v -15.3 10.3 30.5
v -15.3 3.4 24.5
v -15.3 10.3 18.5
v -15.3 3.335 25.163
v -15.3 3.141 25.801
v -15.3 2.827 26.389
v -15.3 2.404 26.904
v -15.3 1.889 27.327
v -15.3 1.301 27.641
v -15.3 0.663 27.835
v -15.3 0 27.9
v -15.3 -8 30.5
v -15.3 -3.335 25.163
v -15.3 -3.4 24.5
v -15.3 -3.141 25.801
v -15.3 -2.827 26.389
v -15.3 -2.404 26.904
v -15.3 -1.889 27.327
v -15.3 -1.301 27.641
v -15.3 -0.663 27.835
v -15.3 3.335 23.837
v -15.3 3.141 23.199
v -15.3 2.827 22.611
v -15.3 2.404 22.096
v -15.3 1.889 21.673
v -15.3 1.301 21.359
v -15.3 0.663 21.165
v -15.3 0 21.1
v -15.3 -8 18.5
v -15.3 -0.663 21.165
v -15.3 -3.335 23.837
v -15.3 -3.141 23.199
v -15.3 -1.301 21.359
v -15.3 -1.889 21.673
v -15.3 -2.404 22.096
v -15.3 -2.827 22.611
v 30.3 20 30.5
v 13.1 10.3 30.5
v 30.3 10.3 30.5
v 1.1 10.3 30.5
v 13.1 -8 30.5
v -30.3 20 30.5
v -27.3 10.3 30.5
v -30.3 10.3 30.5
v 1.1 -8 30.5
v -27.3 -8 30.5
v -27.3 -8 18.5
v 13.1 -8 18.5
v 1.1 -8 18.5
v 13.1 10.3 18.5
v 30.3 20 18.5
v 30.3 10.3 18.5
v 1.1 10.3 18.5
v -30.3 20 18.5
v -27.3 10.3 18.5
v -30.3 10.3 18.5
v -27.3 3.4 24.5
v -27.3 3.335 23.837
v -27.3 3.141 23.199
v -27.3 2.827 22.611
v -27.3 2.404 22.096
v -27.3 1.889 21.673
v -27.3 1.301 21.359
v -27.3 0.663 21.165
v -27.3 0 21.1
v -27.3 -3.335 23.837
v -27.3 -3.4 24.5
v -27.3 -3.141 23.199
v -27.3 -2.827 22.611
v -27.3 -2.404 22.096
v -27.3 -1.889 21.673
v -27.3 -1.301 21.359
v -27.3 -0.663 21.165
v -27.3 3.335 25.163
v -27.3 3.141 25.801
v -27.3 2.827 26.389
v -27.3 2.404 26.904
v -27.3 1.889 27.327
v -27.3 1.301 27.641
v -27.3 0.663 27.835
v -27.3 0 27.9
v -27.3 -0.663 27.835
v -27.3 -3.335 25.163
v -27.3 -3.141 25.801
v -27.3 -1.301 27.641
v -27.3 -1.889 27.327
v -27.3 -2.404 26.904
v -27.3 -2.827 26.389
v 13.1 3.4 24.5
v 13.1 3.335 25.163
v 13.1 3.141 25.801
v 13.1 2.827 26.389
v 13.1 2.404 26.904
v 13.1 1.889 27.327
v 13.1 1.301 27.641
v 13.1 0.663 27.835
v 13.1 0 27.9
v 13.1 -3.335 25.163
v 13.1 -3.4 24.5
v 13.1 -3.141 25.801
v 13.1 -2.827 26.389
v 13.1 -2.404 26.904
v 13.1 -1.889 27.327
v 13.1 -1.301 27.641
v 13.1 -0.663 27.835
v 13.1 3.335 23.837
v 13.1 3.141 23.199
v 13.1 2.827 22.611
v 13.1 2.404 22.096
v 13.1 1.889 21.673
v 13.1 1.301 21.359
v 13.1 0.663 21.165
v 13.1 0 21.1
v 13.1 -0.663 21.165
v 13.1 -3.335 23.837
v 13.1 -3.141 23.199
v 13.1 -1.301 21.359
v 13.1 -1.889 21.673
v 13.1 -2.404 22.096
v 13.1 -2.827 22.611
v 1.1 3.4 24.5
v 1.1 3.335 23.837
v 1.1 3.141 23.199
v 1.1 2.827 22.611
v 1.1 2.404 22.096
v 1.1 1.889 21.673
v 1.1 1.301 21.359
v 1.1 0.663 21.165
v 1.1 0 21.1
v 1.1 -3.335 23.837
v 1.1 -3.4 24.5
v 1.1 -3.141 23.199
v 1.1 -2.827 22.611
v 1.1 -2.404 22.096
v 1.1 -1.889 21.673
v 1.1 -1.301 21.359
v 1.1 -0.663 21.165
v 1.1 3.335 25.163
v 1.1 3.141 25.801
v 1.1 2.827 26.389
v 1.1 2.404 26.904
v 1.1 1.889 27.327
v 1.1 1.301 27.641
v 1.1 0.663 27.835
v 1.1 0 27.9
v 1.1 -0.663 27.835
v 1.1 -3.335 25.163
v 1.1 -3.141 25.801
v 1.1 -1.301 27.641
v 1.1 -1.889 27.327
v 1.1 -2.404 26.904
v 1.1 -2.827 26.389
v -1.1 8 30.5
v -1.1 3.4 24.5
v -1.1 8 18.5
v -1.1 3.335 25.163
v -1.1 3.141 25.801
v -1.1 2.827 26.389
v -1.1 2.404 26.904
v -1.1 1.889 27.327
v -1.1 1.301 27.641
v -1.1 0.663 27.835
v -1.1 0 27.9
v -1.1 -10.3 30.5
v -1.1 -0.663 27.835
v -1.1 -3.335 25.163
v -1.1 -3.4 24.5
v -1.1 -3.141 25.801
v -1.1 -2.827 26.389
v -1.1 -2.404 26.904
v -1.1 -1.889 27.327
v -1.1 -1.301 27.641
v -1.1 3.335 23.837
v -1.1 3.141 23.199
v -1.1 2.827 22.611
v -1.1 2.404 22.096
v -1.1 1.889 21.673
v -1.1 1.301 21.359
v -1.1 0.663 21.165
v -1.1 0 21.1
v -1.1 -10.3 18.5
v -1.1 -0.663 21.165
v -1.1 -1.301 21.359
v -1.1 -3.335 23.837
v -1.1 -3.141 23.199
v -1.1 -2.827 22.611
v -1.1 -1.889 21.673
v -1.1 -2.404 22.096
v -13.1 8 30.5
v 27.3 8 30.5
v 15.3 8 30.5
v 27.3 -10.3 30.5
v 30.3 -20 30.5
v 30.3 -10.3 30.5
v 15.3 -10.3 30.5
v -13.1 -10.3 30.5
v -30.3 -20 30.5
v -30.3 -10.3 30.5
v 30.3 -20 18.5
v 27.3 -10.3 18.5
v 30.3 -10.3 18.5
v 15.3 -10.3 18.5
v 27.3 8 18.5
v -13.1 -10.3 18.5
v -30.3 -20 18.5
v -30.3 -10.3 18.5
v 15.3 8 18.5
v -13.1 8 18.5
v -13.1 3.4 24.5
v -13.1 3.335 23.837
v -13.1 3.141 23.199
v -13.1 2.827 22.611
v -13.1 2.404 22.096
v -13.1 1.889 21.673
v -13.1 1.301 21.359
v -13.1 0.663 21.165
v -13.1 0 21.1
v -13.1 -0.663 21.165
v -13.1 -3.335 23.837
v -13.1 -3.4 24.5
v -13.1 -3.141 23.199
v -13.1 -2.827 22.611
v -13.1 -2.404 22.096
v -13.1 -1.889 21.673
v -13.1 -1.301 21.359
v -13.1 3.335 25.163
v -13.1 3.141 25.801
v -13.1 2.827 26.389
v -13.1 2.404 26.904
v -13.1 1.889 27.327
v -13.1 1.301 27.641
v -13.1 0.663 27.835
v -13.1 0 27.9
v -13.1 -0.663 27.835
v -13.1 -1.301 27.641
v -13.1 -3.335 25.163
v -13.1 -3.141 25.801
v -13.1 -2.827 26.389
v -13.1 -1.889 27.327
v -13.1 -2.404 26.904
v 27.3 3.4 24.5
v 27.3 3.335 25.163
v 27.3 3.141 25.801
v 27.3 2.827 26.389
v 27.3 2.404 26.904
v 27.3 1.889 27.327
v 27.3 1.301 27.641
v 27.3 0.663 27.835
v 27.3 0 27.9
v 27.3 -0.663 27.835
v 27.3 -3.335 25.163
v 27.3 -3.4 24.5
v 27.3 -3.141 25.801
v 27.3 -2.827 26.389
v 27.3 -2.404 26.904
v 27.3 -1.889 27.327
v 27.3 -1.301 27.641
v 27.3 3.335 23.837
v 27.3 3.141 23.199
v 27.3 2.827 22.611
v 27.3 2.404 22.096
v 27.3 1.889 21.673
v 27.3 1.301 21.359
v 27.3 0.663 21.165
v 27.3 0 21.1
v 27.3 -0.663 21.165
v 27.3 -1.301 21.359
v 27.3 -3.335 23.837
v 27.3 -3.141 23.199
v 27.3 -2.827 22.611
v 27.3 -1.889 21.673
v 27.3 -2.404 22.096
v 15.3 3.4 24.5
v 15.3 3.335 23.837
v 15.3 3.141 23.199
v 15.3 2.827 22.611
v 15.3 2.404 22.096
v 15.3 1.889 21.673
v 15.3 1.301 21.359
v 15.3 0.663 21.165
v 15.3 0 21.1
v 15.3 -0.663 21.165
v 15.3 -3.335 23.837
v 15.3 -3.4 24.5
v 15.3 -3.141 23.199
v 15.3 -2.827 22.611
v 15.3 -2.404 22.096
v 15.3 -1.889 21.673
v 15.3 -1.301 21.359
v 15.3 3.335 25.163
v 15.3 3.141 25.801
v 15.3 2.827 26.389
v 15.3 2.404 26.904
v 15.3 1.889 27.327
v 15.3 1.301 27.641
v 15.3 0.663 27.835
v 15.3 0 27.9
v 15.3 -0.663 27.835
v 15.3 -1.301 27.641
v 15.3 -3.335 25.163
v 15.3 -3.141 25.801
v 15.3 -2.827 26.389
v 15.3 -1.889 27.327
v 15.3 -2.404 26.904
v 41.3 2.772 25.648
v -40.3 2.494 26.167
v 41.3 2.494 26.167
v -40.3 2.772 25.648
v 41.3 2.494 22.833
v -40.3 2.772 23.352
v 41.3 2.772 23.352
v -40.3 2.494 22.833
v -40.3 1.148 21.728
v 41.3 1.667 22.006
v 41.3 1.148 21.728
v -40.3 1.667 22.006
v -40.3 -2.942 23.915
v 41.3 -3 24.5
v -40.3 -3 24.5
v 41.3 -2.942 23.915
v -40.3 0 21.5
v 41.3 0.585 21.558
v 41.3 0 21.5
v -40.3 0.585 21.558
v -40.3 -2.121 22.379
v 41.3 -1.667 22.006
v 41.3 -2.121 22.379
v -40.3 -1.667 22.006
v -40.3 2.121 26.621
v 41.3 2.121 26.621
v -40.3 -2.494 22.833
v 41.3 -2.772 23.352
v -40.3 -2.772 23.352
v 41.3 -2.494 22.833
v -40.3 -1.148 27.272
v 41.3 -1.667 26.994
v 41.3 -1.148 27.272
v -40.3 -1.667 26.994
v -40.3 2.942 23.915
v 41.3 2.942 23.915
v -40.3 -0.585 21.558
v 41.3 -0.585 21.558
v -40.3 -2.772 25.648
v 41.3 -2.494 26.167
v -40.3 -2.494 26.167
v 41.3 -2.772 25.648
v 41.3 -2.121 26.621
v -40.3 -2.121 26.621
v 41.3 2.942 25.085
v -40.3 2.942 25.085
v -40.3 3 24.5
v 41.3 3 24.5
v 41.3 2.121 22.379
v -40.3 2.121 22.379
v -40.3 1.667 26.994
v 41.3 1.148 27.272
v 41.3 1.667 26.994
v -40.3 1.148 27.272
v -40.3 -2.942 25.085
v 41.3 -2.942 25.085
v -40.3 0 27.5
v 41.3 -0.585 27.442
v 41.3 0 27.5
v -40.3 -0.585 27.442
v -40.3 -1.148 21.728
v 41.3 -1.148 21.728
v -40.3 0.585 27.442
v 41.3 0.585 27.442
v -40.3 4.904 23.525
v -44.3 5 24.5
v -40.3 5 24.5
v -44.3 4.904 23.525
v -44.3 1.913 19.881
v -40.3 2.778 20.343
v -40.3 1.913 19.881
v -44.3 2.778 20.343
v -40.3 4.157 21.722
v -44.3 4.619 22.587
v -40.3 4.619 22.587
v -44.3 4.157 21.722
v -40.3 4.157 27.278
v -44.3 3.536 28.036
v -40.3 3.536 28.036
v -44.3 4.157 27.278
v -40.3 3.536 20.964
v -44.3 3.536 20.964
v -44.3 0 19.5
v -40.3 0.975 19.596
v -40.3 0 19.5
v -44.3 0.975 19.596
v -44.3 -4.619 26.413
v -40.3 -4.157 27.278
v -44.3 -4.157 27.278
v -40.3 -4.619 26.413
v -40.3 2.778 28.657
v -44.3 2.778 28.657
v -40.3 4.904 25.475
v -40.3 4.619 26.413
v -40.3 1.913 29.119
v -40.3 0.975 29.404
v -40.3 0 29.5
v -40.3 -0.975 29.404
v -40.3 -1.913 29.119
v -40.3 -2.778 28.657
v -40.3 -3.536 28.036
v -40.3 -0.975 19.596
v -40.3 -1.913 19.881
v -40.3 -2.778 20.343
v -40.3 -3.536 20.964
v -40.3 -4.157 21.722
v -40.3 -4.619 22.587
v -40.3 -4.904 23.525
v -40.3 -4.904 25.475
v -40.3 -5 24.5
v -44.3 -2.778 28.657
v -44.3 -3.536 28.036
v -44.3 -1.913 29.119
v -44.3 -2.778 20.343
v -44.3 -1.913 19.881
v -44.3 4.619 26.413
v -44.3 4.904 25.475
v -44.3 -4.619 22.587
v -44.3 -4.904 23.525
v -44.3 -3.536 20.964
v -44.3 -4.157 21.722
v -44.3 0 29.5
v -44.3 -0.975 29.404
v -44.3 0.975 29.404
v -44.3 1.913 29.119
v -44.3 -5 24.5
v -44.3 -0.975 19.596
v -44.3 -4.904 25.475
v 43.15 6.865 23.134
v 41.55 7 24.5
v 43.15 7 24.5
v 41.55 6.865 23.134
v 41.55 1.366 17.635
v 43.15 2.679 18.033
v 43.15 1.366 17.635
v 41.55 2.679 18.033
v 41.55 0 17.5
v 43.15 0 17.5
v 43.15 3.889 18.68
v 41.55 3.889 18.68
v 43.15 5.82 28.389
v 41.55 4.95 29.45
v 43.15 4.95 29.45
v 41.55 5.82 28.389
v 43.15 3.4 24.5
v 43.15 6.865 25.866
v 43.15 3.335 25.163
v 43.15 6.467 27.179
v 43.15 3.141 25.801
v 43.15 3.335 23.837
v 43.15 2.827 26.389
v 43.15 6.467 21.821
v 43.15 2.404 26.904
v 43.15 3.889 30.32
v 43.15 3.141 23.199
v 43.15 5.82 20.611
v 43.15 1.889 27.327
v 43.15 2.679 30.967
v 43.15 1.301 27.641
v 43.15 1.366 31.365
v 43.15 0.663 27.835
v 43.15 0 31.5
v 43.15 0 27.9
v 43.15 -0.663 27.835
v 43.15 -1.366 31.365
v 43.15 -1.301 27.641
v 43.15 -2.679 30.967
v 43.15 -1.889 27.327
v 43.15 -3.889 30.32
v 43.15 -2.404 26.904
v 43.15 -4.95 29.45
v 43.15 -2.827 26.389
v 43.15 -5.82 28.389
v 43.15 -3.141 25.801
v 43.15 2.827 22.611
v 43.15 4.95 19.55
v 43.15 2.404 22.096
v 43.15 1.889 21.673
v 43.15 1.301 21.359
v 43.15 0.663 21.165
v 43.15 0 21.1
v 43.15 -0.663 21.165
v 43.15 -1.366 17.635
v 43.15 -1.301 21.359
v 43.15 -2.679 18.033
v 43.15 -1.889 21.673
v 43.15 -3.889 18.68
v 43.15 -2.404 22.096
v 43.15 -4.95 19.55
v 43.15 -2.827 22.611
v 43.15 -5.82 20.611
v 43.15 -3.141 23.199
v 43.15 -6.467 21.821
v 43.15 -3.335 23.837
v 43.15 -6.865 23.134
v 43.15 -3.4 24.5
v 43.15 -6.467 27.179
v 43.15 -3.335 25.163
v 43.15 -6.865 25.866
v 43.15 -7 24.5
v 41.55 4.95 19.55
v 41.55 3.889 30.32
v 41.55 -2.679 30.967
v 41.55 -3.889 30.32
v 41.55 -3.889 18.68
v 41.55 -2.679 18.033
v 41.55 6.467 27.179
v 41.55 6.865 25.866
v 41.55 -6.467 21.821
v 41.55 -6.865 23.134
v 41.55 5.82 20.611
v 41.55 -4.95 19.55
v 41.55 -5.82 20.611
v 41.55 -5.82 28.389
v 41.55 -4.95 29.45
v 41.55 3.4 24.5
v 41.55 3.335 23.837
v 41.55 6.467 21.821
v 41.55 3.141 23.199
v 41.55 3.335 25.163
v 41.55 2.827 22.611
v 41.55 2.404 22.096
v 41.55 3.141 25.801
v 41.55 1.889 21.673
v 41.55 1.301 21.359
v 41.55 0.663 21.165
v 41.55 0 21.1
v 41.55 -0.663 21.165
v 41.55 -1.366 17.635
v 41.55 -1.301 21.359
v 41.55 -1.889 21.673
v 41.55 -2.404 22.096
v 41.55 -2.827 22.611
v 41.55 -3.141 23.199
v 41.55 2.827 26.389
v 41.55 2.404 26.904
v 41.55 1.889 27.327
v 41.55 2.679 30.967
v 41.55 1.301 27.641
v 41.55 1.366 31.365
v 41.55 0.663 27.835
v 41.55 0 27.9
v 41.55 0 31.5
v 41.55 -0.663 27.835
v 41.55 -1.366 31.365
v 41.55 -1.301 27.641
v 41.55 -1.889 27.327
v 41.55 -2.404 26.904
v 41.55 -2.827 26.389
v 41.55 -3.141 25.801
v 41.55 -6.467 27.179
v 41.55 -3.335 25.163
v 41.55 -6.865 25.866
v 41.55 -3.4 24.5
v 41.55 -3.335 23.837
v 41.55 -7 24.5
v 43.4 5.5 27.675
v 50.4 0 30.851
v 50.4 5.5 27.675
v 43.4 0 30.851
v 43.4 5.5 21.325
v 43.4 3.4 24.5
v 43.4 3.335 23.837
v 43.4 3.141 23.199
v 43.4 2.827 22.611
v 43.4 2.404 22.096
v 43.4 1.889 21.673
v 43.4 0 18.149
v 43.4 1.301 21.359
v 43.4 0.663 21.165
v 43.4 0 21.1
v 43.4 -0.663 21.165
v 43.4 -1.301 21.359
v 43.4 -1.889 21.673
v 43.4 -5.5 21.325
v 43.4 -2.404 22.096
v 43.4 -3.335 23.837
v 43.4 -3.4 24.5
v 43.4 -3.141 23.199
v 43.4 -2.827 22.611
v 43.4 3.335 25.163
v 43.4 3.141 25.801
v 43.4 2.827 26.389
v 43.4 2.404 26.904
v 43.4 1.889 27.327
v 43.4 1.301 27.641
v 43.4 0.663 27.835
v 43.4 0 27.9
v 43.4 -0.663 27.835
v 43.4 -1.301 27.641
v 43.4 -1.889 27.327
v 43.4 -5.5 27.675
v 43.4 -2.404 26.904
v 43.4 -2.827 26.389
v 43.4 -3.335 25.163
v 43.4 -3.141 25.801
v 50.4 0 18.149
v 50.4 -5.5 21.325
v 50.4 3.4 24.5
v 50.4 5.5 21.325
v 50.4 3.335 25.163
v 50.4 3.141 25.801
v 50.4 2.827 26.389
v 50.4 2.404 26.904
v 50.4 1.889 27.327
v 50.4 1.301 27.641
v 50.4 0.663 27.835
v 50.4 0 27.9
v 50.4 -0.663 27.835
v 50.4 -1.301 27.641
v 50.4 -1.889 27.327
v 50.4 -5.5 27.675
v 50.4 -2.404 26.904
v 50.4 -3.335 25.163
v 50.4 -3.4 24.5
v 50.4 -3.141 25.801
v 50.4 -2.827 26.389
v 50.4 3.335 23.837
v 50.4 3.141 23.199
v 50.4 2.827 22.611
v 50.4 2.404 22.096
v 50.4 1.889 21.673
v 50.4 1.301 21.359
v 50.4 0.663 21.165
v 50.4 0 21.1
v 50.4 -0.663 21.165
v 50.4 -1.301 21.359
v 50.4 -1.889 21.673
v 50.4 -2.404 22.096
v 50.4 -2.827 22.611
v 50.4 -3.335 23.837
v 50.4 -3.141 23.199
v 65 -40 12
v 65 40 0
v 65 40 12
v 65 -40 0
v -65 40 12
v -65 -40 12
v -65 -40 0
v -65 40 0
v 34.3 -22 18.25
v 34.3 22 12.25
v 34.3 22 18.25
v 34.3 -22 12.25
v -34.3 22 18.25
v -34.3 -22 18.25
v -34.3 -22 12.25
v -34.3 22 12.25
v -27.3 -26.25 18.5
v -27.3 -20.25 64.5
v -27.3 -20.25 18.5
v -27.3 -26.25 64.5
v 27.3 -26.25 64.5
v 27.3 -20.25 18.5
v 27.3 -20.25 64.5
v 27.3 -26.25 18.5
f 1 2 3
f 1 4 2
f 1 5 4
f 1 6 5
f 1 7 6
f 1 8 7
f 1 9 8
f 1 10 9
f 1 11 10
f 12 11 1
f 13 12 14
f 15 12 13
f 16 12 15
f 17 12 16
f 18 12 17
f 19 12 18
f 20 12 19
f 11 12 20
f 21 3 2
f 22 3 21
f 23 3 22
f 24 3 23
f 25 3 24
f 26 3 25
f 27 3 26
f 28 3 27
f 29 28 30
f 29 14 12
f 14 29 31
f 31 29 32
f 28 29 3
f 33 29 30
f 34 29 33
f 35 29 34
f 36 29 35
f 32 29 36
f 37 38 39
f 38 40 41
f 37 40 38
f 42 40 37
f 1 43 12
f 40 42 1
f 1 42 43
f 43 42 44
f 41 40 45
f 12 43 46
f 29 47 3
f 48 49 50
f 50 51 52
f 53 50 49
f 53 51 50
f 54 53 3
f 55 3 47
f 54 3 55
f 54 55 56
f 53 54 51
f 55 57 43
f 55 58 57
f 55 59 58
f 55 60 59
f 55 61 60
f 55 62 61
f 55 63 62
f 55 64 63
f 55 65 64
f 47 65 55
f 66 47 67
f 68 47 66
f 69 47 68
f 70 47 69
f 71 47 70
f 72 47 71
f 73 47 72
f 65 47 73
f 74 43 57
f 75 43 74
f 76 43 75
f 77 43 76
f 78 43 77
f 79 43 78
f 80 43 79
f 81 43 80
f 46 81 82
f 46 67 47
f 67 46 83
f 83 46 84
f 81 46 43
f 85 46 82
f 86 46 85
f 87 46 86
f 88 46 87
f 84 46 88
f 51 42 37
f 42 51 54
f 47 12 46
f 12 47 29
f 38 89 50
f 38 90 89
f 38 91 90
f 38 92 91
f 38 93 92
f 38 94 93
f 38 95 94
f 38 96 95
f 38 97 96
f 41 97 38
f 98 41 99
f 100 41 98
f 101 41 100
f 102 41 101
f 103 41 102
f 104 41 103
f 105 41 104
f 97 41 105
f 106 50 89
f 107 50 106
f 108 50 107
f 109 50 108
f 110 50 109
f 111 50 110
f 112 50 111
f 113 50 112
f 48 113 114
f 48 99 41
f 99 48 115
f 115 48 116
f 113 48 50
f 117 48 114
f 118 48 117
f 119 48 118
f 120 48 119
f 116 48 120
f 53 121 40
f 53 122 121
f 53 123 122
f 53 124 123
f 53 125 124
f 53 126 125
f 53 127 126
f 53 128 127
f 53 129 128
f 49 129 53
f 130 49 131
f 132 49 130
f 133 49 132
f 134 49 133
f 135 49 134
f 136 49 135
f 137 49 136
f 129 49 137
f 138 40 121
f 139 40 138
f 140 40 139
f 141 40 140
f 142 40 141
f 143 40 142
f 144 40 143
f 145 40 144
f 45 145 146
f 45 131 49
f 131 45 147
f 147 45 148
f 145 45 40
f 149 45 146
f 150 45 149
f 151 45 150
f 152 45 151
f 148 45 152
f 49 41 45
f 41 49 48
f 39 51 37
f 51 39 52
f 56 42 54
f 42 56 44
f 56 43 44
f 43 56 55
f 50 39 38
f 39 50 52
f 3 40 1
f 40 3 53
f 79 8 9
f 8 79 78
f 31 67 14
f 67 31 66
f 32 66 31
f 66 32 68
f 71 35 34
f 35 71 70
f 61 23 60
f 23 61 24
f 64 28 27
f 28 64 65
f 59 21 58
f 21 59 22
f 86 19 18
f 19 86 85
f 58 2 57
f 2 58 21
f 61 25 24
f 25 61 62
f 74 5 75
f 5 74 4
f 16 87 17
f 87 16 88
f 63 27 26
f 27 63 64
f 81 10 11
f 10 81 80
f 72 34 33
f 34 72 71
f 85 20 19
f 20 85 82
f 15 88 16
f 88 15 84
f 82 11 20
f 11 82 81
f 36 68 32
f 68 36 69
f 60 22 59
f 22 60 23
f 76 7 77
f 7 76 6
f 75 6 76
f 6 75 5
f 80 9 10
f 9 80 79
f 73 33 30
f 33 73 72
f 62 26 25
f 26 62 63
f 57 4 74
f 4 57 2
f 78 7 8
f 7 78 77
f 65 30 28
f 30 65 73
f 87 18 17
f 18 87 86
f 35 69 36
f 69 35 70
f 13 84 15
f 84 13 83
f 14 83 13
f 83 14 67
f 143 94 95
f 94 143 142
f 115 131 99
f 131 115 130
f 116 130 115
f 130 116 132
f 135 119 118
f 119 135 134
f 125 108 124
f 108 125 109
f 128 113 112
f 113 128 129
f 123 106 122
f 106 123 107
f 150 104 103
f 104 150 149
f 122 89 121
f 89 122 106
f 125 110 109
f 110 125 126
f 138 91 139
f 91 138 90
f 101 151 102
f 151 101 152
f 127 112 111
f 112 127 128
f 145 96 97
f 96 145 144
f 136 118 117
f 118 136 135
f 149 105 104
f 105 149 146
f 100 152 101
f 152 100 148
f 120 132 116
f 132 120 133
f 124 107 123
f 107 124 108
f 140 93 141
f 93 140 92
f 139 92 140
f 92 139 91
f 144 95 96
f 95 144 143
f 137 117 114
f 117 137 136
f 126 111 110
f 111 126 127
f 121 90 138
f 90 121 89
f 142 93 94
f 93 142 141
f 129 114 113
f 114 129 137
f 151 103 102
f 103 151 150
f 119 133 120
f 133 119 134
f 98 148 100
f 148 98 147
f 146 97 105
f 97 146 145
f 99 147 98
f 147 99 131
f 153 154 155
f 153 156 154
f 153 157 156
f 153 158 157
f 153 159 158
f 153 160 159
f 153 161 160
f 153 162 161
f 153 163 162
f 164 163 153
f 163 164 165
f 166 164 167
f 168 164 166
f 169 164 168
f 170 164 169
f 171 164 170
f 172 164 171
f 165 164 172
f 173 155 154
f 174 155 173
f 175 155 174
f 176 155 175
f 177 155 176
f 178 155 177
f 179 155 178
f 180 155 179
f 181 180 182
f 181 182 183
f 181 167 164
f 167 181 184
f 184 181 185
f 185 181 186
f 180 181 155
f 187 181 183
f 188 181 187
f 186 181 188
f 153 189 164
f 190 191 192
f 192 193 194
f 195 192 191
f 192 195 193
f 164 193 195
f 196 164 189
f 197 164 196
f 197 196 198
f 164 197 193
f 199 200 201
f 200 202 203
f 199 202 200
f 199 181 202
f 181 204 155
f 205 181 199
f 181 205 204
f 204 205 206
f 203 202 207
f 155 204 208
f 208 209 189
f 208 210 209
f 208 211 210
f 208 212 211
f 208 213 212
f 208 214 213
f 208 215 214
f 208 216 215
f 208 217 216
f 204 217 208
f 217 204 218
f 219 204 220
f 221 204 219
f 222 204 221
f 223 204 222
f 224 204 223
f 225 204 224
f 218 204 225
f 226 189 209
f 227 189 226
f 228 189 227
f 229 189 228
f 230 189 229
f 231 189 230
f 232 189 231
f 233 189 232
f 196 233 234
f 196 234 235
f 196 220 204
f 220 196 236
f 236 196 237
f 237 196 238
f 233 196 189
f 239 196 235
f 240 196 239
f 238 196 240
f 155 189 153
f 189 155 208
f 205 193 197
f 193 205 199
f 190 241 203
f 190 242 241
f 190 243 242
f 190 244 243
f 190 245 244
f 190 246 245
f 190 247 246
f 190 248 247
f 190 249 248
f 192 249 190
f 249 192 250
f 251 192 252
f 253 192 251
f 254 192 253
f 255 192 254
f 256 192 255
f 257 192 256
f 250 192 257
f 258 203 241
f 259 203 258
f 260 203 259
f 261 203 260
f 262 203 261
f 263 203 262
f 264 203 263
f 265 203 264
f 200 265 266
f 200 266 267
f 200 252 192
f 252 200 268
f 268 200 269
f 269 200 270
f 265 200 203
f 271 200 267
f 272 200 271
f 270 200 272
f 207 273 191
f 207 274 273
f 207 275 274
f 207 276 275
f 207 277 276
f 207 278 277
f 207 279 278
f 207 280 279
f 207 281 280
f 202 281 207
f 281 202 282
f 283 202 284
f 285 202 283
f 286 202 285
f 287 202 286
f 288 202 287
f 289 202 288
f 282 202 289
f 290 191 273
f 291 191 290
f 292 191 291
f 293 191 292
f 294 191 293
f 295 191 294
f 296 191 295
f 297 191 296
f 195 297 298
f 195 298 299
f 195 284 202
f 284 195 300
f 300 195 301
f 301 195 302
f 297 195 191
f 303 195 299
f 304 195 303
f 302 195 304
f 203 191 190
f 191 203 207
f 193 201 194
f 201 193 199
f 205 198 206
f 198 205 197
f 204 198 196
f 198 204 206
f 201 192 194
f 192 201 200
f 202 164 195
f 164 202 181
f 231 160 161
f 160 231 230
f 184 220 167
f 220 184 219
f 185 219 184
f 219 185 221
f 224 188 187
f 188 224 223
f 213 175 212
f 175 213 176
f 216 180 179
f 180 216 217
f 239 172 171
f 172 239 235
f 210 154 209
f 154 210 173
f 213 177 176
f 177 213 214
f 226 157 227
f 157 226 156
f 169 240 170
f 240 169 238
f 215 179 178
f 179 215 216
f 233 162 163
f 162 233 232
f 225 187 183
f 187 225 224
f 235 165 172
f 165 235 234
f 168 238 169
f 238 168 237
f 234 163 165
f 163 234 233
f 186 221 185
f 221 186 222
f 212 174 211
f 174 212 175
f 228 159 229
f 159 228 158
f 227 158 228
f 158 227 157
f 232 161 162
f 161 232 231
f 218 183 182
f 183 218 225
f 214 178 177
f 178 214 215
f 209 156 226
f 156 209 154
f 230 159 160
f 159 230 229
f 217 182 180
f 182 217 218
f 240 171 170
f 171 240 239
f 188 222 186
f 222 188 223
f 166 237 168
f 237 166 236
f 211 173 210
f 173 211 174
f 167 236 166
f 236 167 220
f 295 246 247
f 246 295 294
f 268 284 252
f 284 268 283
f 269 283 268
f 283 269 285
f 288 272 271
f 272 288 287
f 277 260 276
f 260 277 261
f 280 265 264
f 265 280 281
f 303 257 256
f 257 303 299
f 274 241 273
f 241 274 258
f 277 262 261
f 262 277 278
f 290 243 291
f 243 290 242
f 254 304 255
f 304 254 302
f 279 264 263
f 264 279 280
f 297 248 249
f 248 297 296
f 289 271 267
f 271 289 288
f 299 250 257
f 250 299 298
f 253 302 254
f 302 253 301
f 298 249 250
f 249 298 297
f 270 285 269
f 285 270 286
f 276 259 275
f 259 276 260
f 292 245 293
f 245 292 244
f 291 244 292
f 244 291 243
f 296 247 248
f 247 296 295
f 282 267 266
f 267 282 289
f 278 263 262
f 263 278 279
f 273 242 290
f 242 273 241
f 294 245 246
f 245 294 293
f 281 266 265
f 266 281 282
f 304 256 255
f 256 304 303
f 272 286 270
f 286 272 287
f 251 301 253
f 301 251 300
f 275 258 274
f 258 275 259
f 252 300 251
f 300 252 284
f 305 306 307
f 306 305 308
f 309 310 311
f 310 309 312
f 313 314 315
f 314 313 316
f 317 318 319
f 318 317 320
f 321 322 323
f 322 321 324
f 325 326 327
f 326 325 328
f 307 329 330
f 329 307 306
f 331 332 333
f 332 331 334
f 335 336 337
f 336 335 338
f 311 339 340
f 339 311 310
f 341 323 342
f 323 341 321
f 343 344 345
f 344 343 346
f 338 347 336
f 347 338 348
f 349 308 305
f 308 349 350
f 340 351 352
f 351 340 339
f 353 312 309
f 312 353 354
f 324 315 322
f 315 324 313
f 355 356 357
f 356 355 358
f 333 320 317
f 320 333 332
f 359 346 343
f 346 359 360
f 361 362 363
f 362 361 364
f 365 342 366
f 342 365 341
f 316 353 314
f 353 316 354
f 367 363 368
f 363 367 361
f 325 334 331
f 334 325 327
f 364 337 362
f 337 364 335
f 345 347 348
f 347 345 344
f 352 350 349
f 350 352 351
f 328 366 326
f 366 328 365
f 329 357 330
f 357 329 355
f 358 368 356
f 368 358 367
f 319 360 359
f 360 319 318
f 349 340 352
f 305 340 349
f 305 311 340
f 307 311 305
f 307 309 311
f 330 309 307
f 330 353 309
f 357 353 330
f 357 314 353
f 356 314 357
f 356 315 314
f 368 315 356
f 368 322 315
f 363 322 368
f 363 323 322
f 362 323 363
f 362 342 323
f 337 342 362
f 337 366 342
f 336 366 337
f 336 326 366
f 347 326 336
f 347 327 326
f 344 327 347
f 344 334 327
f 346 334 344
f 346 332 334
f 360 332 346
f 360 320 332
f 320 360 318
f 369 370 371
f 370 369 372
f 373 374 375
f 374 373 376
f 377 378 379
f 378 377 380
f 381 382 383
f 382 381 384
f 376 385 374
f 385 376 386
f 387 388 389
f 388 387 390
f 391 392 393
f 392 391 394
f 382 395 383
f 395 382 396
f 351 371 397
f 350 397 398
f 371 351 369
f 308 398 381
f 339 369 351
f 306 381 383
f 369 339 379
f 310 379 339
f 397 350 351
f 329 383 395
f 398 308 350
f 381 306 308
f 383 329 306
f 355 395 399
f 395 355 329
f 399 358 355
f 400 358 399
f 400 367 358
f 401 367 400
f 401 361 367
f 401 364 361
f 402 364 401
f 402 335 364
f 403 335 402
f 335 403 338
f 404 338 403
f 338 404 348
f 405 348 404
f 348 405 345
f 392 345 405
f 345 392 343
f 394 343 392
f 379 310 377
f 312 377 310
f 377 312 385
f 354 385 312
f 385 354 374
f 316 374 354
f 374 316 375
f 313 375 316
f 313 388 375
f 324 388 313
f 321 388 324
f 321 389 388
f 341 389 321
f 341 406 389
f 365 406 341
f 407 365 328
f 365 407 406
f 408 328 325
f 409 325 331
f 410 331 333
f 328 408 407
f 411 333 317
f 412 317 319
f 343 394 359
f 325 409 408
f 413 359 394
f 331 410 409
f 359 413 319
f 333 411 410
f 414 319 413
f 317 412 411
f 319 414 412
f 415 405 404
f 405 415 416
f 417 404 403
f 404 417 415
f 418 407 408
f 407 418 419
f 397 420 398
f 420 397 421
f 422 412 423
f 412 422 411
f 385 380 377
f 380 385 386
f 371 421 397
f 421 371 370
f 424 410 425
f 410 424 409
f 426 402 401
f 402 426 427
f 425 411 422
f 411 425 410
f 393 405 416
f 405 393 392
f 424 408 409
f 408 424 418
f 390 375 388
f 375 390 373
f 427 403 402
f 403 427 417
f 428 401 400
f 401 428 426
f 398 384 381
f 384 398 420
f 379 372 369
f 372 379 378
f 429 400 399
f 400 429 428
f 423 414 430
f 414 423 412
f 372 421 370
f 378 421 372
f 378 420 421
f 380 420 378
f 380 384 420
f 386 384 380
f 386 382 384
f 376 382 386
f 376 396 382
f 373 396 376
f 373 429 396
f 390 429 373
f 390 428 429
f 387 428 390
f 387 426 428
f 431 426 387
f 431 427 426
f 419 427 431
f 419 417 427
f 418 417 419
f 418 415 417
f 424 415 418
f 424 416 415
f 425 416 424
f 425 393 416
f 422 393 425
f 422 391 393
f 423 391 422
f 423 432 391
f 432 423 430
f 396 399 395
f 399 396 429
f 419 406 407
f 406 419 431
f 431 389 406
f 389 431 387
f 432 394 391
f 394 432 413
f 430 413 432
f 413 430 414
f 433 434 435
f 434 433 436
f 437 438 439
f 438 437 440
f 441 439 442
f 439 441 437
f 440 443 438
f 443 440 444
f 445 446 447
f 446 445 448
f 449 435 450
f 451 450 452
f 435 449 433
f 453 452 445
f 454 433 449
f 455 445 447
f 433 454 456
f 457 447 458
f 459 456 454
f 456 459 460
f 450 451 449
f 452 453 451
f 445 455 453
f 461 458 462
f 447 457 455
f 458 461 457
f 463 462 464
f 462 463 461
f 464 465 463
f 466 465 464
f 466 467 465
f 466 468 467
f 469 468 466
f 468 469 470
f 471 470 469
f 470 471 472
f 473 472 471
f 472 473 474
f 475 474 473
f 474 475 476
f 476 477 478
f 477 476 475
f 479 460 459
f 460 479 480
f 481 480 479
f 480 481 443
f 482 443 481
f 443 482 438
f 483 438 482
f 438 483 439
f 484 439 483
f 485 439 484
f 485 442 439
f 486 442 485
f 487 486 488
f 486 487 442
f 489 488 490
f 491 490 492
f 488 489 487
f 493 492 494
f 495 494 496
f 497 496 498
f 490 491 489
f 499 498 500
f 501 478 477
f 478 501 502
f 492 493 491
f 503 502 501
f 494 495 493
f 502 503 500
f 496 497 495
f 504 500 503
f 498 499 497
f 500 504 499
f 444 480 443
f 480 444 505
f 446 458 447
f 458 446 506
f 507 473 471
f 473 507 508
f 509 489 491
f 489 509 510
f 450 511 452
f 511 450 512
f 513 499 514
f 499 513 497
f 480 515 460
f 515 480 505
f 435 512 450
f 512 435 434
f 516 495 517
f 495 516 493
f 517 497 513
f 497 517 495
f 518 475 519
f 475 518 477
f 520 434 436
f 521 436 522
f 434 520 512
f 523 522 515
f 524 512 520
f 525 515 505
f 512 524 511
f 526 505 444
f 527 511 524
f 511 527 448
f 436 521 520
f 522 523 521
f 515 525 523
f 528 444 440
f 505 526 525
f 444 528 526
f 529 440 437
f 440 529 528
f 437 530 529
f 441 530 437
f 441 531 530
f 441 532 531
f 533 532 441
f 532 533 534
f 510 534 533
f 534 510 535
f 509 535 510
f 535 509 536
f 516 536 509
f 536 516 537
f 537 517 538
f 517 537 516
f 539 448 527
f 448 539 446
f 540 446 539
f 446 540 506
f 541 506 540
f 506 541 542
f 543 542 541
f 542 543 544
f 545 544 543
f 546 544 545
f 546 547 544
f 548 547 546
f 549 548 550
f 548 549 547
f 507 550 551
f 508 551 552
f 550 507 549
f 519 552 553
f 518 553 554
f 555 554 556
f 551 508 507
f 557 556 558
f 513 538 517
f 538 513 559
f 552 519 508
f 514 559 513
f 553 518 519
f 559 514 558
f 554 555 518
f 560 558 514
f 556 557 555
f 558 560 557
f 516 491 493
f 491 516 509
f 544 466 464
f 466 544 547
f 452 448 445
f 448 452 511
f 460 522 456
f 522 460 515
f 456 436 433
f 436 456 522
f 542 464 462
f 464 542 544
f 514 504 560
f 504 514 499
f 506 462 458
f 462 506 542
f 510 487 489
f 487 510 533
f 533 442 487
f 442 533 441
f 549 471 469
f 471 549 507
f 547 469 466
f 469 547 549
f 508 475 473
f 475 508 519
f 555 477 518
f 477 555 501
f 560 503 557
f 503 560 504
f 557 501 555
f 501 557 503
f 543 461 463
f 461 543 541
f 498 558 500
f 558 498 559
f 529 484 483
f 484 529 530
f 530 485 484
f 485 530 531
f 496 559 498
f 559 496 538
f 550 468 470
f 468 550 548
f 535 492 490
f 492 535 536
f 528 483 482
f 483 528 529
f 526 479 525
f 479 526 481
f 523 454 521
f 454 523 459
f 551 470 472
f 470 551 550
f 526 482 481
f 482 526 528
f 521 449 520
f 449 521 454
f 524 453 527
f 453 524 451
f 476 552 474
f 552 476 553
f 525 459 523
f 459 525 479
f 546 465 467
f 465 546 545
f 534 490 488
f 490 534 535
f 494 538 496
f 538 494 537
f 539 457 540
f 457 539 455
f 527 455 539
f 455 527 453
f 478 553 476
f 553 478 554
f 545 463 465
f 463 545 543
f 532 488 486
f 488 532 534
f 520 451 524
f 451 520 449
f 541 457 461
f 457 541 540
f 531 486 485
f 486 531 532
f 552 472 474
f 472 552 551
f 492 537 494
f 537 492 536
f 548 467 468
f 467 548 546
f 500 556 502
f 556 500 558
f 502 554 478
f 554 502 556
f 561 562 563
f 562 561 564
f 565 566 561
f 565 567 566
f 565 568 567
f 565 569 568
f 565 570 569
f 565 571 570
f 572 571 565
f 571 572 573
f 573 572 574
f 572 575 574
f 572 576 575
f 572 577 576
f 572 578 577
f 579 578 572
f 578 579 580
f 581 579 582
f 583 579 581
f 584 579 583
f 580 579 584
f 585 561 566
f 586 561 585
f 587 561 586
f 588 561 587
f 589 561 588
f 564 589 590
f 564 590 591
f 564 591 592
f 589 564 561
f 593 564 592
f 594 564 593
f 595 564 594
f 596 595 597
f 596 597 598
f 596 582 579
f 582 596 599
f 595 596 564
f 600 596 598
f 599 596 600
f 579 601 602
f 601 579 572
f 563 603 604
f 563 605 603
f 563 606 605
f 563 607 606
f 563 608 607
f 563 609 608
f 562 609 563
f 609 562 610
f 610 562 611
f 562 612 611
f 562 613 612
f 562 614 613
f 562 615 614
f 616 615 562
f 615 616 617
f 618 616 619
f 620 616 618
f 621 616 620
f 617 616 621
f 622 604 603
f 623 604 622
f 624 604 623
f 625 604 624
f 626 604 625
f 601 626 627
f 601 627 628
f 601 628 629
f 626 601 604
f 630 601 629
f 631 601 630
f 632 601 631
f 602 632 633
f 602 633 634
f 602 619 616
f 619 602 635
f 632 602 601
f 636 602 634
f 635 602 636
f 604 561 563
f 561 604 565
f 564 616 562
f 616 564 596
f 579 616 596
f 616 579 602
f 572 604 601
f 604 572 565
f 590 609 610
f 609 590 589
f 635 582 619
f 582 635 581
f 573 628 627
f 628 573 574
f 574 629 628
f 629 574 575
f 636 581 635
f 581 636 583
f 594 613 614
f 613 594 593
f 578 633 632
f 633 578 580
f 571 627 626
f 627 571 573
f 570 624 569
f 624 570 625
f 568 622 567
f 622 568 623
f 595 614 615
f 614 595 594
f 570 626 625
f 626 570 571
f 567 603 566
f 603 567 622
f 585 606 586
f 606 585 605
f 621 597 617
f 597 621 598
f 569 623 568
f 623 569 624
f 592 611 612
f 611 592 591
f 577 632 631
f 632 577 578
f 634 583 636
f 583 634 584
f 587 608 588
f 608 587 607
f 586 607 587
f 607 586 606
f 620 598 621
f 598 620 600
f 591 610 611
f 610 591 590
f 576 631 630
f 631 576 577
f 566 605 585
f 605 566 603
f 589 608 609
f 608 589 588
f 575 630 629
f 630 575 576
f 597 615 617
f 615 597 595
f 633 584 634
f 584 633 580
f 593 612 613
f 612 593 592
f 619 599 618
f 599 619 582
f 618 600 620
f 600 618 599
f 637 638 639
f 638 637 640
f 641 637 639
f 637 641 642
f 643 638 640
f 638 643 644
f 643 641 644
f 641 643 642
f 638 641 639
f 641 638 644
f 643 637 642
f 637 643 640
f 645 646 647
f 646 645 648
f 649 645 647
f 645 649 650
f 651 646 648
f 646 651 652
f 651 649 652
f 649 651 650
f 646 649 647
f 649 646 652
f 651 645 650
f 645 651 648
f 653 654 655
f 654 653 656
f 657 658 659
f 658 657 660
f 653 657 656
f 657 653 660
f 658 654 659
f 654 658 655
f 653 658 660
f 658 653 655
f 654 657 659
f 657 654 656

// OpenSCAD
$fn = 32;

// ------------------------------------------------------------------------
// Comb hinge with flap: leaf 60.6 x 20 mm, pin d6, flap 46 mm
// Every part is its own module, assembly() places every instance.
// ------------------------------------------------------------------------

// --- part 1 ---
module hinge_bed() {
  difference() {
    translate([-65, -40, 0]) cube([130, 80, 12]);
  }
}

// --- part 2 ---
module hinge_riser() {
  difference() {
    translate([-34.3, -22, 0]) cube([68.6, 44, 6]);
  }
}

// --- part 3 ---
module hinge_leaf_a() {
  difference() {
    union() {
      translate([-27.3, -8, -6]) cube([12, 28, 12]);
      translate([1.1, -8, -6]) cube([12, 28, 12]);
      translate([-30.3, 10.3, -6]) cube([60.6, 9.7, 12]);
    }
    translate([-21.3, 0, 0]) rotate([0, 90, 0]) cylinder(h = 14, d = 6.8, center = true);
    translate([7.1, 0, 0]) rotate([0, 90, 0]) cylinder(h = 14, d = 6.8, center = true);
  }
}

// --- part 4 ---
module hinge_leaf_b() {
  difference() {
    union() {
      translate([-13.1, -20, -6]) cube([12, 28, 12]);
      translate([15.3, -20, -6]) cube([12, 28, 12]);
      translate([-30.3, -20, -6]) cube([60.6, 9.7, 12]);
    }
    translate([-7.1, 0, 0]) rotate([0, 90, 0]) cylinder(h = 14, d = 6.8, center = true);
    translate([21.3, 0, 0]) rotate([0, 90, 0]) cylinder(h = 14, d = 6.8, center = true);
  }
}

// --- part 5 ---
module hinge_flap() {
  difference() {
    translate([-27.3, -23, 0]) cube([54.6, 46, 6]);
  }
}

// --- part 6 ---
module hinge_pin() {
  rotate([0, 90, 0]) cylinder(h = 82.6, d = 6, center = true);
  translate([-44.3, 0, 0]) rotate([0, 90, 0]) cylinder(h = 4, d = 10);
}

// --- part 7 ---
module pin_washer() {
  difference() {
      translate([0, 0, 0]) cylinder(h = 1.6, d = 14);
      translate([0, 0, -1]) cylinder(h = 3.6, d = 6.8);
    }
}

// --- part 8 ---
module pin_nut() {
  difference() {
    linear_extrude(height = 7) polygon(points = [[6.351, 0], [3.175, 5.5], [-3.175, 5.5], [-6.351, 0], [-3.175, -5.5], [3.175, -5.5]]);
    translate([0, 0, -1]) cylinder(h = 9, d = 6.8);
  }
}

// --- assembly ---
module assembly() {
  color([0.80, 0.24, 0.20]) translate([0, 0, 0]) rotate([0, 0, 0]) hinge_bed();
  color([0.20, 0.45, 0.75]) translate([0, 0, 12.25]) rotate([0, 0, 0]) hinge_riser();
  color([0.25, 0.62, 0.32]) translate([0, 0, 24.5]) rotate([0, 0, 0]) hinge_leaf_a();
  color([0.92, 0.70, 0.18]) translate([0, 0, 24.5]) rotate([0, 0, 0]) hinge_leaf_b();
  color([0.58, 0.35, 0.70]) translate([0, -20.25, 41.5]) rotate([90, 0, 0]) hinge_flap();
  color([0.16, 0.66, 0.66]) translate([0, 0, 24.5]) rotate([0, 0, 0]) hinge_pin();
  color([0.85, 0.48, 0.18]) translate([41.55, 0, 24.5]) rotate([0, 90, 0]) pin_washer();
  color([0.55, 0.60, 0.65]) translate([43.4, 0, 24.5]) rotate([0, 90, 0]) pin_nut();
}

assembly();
